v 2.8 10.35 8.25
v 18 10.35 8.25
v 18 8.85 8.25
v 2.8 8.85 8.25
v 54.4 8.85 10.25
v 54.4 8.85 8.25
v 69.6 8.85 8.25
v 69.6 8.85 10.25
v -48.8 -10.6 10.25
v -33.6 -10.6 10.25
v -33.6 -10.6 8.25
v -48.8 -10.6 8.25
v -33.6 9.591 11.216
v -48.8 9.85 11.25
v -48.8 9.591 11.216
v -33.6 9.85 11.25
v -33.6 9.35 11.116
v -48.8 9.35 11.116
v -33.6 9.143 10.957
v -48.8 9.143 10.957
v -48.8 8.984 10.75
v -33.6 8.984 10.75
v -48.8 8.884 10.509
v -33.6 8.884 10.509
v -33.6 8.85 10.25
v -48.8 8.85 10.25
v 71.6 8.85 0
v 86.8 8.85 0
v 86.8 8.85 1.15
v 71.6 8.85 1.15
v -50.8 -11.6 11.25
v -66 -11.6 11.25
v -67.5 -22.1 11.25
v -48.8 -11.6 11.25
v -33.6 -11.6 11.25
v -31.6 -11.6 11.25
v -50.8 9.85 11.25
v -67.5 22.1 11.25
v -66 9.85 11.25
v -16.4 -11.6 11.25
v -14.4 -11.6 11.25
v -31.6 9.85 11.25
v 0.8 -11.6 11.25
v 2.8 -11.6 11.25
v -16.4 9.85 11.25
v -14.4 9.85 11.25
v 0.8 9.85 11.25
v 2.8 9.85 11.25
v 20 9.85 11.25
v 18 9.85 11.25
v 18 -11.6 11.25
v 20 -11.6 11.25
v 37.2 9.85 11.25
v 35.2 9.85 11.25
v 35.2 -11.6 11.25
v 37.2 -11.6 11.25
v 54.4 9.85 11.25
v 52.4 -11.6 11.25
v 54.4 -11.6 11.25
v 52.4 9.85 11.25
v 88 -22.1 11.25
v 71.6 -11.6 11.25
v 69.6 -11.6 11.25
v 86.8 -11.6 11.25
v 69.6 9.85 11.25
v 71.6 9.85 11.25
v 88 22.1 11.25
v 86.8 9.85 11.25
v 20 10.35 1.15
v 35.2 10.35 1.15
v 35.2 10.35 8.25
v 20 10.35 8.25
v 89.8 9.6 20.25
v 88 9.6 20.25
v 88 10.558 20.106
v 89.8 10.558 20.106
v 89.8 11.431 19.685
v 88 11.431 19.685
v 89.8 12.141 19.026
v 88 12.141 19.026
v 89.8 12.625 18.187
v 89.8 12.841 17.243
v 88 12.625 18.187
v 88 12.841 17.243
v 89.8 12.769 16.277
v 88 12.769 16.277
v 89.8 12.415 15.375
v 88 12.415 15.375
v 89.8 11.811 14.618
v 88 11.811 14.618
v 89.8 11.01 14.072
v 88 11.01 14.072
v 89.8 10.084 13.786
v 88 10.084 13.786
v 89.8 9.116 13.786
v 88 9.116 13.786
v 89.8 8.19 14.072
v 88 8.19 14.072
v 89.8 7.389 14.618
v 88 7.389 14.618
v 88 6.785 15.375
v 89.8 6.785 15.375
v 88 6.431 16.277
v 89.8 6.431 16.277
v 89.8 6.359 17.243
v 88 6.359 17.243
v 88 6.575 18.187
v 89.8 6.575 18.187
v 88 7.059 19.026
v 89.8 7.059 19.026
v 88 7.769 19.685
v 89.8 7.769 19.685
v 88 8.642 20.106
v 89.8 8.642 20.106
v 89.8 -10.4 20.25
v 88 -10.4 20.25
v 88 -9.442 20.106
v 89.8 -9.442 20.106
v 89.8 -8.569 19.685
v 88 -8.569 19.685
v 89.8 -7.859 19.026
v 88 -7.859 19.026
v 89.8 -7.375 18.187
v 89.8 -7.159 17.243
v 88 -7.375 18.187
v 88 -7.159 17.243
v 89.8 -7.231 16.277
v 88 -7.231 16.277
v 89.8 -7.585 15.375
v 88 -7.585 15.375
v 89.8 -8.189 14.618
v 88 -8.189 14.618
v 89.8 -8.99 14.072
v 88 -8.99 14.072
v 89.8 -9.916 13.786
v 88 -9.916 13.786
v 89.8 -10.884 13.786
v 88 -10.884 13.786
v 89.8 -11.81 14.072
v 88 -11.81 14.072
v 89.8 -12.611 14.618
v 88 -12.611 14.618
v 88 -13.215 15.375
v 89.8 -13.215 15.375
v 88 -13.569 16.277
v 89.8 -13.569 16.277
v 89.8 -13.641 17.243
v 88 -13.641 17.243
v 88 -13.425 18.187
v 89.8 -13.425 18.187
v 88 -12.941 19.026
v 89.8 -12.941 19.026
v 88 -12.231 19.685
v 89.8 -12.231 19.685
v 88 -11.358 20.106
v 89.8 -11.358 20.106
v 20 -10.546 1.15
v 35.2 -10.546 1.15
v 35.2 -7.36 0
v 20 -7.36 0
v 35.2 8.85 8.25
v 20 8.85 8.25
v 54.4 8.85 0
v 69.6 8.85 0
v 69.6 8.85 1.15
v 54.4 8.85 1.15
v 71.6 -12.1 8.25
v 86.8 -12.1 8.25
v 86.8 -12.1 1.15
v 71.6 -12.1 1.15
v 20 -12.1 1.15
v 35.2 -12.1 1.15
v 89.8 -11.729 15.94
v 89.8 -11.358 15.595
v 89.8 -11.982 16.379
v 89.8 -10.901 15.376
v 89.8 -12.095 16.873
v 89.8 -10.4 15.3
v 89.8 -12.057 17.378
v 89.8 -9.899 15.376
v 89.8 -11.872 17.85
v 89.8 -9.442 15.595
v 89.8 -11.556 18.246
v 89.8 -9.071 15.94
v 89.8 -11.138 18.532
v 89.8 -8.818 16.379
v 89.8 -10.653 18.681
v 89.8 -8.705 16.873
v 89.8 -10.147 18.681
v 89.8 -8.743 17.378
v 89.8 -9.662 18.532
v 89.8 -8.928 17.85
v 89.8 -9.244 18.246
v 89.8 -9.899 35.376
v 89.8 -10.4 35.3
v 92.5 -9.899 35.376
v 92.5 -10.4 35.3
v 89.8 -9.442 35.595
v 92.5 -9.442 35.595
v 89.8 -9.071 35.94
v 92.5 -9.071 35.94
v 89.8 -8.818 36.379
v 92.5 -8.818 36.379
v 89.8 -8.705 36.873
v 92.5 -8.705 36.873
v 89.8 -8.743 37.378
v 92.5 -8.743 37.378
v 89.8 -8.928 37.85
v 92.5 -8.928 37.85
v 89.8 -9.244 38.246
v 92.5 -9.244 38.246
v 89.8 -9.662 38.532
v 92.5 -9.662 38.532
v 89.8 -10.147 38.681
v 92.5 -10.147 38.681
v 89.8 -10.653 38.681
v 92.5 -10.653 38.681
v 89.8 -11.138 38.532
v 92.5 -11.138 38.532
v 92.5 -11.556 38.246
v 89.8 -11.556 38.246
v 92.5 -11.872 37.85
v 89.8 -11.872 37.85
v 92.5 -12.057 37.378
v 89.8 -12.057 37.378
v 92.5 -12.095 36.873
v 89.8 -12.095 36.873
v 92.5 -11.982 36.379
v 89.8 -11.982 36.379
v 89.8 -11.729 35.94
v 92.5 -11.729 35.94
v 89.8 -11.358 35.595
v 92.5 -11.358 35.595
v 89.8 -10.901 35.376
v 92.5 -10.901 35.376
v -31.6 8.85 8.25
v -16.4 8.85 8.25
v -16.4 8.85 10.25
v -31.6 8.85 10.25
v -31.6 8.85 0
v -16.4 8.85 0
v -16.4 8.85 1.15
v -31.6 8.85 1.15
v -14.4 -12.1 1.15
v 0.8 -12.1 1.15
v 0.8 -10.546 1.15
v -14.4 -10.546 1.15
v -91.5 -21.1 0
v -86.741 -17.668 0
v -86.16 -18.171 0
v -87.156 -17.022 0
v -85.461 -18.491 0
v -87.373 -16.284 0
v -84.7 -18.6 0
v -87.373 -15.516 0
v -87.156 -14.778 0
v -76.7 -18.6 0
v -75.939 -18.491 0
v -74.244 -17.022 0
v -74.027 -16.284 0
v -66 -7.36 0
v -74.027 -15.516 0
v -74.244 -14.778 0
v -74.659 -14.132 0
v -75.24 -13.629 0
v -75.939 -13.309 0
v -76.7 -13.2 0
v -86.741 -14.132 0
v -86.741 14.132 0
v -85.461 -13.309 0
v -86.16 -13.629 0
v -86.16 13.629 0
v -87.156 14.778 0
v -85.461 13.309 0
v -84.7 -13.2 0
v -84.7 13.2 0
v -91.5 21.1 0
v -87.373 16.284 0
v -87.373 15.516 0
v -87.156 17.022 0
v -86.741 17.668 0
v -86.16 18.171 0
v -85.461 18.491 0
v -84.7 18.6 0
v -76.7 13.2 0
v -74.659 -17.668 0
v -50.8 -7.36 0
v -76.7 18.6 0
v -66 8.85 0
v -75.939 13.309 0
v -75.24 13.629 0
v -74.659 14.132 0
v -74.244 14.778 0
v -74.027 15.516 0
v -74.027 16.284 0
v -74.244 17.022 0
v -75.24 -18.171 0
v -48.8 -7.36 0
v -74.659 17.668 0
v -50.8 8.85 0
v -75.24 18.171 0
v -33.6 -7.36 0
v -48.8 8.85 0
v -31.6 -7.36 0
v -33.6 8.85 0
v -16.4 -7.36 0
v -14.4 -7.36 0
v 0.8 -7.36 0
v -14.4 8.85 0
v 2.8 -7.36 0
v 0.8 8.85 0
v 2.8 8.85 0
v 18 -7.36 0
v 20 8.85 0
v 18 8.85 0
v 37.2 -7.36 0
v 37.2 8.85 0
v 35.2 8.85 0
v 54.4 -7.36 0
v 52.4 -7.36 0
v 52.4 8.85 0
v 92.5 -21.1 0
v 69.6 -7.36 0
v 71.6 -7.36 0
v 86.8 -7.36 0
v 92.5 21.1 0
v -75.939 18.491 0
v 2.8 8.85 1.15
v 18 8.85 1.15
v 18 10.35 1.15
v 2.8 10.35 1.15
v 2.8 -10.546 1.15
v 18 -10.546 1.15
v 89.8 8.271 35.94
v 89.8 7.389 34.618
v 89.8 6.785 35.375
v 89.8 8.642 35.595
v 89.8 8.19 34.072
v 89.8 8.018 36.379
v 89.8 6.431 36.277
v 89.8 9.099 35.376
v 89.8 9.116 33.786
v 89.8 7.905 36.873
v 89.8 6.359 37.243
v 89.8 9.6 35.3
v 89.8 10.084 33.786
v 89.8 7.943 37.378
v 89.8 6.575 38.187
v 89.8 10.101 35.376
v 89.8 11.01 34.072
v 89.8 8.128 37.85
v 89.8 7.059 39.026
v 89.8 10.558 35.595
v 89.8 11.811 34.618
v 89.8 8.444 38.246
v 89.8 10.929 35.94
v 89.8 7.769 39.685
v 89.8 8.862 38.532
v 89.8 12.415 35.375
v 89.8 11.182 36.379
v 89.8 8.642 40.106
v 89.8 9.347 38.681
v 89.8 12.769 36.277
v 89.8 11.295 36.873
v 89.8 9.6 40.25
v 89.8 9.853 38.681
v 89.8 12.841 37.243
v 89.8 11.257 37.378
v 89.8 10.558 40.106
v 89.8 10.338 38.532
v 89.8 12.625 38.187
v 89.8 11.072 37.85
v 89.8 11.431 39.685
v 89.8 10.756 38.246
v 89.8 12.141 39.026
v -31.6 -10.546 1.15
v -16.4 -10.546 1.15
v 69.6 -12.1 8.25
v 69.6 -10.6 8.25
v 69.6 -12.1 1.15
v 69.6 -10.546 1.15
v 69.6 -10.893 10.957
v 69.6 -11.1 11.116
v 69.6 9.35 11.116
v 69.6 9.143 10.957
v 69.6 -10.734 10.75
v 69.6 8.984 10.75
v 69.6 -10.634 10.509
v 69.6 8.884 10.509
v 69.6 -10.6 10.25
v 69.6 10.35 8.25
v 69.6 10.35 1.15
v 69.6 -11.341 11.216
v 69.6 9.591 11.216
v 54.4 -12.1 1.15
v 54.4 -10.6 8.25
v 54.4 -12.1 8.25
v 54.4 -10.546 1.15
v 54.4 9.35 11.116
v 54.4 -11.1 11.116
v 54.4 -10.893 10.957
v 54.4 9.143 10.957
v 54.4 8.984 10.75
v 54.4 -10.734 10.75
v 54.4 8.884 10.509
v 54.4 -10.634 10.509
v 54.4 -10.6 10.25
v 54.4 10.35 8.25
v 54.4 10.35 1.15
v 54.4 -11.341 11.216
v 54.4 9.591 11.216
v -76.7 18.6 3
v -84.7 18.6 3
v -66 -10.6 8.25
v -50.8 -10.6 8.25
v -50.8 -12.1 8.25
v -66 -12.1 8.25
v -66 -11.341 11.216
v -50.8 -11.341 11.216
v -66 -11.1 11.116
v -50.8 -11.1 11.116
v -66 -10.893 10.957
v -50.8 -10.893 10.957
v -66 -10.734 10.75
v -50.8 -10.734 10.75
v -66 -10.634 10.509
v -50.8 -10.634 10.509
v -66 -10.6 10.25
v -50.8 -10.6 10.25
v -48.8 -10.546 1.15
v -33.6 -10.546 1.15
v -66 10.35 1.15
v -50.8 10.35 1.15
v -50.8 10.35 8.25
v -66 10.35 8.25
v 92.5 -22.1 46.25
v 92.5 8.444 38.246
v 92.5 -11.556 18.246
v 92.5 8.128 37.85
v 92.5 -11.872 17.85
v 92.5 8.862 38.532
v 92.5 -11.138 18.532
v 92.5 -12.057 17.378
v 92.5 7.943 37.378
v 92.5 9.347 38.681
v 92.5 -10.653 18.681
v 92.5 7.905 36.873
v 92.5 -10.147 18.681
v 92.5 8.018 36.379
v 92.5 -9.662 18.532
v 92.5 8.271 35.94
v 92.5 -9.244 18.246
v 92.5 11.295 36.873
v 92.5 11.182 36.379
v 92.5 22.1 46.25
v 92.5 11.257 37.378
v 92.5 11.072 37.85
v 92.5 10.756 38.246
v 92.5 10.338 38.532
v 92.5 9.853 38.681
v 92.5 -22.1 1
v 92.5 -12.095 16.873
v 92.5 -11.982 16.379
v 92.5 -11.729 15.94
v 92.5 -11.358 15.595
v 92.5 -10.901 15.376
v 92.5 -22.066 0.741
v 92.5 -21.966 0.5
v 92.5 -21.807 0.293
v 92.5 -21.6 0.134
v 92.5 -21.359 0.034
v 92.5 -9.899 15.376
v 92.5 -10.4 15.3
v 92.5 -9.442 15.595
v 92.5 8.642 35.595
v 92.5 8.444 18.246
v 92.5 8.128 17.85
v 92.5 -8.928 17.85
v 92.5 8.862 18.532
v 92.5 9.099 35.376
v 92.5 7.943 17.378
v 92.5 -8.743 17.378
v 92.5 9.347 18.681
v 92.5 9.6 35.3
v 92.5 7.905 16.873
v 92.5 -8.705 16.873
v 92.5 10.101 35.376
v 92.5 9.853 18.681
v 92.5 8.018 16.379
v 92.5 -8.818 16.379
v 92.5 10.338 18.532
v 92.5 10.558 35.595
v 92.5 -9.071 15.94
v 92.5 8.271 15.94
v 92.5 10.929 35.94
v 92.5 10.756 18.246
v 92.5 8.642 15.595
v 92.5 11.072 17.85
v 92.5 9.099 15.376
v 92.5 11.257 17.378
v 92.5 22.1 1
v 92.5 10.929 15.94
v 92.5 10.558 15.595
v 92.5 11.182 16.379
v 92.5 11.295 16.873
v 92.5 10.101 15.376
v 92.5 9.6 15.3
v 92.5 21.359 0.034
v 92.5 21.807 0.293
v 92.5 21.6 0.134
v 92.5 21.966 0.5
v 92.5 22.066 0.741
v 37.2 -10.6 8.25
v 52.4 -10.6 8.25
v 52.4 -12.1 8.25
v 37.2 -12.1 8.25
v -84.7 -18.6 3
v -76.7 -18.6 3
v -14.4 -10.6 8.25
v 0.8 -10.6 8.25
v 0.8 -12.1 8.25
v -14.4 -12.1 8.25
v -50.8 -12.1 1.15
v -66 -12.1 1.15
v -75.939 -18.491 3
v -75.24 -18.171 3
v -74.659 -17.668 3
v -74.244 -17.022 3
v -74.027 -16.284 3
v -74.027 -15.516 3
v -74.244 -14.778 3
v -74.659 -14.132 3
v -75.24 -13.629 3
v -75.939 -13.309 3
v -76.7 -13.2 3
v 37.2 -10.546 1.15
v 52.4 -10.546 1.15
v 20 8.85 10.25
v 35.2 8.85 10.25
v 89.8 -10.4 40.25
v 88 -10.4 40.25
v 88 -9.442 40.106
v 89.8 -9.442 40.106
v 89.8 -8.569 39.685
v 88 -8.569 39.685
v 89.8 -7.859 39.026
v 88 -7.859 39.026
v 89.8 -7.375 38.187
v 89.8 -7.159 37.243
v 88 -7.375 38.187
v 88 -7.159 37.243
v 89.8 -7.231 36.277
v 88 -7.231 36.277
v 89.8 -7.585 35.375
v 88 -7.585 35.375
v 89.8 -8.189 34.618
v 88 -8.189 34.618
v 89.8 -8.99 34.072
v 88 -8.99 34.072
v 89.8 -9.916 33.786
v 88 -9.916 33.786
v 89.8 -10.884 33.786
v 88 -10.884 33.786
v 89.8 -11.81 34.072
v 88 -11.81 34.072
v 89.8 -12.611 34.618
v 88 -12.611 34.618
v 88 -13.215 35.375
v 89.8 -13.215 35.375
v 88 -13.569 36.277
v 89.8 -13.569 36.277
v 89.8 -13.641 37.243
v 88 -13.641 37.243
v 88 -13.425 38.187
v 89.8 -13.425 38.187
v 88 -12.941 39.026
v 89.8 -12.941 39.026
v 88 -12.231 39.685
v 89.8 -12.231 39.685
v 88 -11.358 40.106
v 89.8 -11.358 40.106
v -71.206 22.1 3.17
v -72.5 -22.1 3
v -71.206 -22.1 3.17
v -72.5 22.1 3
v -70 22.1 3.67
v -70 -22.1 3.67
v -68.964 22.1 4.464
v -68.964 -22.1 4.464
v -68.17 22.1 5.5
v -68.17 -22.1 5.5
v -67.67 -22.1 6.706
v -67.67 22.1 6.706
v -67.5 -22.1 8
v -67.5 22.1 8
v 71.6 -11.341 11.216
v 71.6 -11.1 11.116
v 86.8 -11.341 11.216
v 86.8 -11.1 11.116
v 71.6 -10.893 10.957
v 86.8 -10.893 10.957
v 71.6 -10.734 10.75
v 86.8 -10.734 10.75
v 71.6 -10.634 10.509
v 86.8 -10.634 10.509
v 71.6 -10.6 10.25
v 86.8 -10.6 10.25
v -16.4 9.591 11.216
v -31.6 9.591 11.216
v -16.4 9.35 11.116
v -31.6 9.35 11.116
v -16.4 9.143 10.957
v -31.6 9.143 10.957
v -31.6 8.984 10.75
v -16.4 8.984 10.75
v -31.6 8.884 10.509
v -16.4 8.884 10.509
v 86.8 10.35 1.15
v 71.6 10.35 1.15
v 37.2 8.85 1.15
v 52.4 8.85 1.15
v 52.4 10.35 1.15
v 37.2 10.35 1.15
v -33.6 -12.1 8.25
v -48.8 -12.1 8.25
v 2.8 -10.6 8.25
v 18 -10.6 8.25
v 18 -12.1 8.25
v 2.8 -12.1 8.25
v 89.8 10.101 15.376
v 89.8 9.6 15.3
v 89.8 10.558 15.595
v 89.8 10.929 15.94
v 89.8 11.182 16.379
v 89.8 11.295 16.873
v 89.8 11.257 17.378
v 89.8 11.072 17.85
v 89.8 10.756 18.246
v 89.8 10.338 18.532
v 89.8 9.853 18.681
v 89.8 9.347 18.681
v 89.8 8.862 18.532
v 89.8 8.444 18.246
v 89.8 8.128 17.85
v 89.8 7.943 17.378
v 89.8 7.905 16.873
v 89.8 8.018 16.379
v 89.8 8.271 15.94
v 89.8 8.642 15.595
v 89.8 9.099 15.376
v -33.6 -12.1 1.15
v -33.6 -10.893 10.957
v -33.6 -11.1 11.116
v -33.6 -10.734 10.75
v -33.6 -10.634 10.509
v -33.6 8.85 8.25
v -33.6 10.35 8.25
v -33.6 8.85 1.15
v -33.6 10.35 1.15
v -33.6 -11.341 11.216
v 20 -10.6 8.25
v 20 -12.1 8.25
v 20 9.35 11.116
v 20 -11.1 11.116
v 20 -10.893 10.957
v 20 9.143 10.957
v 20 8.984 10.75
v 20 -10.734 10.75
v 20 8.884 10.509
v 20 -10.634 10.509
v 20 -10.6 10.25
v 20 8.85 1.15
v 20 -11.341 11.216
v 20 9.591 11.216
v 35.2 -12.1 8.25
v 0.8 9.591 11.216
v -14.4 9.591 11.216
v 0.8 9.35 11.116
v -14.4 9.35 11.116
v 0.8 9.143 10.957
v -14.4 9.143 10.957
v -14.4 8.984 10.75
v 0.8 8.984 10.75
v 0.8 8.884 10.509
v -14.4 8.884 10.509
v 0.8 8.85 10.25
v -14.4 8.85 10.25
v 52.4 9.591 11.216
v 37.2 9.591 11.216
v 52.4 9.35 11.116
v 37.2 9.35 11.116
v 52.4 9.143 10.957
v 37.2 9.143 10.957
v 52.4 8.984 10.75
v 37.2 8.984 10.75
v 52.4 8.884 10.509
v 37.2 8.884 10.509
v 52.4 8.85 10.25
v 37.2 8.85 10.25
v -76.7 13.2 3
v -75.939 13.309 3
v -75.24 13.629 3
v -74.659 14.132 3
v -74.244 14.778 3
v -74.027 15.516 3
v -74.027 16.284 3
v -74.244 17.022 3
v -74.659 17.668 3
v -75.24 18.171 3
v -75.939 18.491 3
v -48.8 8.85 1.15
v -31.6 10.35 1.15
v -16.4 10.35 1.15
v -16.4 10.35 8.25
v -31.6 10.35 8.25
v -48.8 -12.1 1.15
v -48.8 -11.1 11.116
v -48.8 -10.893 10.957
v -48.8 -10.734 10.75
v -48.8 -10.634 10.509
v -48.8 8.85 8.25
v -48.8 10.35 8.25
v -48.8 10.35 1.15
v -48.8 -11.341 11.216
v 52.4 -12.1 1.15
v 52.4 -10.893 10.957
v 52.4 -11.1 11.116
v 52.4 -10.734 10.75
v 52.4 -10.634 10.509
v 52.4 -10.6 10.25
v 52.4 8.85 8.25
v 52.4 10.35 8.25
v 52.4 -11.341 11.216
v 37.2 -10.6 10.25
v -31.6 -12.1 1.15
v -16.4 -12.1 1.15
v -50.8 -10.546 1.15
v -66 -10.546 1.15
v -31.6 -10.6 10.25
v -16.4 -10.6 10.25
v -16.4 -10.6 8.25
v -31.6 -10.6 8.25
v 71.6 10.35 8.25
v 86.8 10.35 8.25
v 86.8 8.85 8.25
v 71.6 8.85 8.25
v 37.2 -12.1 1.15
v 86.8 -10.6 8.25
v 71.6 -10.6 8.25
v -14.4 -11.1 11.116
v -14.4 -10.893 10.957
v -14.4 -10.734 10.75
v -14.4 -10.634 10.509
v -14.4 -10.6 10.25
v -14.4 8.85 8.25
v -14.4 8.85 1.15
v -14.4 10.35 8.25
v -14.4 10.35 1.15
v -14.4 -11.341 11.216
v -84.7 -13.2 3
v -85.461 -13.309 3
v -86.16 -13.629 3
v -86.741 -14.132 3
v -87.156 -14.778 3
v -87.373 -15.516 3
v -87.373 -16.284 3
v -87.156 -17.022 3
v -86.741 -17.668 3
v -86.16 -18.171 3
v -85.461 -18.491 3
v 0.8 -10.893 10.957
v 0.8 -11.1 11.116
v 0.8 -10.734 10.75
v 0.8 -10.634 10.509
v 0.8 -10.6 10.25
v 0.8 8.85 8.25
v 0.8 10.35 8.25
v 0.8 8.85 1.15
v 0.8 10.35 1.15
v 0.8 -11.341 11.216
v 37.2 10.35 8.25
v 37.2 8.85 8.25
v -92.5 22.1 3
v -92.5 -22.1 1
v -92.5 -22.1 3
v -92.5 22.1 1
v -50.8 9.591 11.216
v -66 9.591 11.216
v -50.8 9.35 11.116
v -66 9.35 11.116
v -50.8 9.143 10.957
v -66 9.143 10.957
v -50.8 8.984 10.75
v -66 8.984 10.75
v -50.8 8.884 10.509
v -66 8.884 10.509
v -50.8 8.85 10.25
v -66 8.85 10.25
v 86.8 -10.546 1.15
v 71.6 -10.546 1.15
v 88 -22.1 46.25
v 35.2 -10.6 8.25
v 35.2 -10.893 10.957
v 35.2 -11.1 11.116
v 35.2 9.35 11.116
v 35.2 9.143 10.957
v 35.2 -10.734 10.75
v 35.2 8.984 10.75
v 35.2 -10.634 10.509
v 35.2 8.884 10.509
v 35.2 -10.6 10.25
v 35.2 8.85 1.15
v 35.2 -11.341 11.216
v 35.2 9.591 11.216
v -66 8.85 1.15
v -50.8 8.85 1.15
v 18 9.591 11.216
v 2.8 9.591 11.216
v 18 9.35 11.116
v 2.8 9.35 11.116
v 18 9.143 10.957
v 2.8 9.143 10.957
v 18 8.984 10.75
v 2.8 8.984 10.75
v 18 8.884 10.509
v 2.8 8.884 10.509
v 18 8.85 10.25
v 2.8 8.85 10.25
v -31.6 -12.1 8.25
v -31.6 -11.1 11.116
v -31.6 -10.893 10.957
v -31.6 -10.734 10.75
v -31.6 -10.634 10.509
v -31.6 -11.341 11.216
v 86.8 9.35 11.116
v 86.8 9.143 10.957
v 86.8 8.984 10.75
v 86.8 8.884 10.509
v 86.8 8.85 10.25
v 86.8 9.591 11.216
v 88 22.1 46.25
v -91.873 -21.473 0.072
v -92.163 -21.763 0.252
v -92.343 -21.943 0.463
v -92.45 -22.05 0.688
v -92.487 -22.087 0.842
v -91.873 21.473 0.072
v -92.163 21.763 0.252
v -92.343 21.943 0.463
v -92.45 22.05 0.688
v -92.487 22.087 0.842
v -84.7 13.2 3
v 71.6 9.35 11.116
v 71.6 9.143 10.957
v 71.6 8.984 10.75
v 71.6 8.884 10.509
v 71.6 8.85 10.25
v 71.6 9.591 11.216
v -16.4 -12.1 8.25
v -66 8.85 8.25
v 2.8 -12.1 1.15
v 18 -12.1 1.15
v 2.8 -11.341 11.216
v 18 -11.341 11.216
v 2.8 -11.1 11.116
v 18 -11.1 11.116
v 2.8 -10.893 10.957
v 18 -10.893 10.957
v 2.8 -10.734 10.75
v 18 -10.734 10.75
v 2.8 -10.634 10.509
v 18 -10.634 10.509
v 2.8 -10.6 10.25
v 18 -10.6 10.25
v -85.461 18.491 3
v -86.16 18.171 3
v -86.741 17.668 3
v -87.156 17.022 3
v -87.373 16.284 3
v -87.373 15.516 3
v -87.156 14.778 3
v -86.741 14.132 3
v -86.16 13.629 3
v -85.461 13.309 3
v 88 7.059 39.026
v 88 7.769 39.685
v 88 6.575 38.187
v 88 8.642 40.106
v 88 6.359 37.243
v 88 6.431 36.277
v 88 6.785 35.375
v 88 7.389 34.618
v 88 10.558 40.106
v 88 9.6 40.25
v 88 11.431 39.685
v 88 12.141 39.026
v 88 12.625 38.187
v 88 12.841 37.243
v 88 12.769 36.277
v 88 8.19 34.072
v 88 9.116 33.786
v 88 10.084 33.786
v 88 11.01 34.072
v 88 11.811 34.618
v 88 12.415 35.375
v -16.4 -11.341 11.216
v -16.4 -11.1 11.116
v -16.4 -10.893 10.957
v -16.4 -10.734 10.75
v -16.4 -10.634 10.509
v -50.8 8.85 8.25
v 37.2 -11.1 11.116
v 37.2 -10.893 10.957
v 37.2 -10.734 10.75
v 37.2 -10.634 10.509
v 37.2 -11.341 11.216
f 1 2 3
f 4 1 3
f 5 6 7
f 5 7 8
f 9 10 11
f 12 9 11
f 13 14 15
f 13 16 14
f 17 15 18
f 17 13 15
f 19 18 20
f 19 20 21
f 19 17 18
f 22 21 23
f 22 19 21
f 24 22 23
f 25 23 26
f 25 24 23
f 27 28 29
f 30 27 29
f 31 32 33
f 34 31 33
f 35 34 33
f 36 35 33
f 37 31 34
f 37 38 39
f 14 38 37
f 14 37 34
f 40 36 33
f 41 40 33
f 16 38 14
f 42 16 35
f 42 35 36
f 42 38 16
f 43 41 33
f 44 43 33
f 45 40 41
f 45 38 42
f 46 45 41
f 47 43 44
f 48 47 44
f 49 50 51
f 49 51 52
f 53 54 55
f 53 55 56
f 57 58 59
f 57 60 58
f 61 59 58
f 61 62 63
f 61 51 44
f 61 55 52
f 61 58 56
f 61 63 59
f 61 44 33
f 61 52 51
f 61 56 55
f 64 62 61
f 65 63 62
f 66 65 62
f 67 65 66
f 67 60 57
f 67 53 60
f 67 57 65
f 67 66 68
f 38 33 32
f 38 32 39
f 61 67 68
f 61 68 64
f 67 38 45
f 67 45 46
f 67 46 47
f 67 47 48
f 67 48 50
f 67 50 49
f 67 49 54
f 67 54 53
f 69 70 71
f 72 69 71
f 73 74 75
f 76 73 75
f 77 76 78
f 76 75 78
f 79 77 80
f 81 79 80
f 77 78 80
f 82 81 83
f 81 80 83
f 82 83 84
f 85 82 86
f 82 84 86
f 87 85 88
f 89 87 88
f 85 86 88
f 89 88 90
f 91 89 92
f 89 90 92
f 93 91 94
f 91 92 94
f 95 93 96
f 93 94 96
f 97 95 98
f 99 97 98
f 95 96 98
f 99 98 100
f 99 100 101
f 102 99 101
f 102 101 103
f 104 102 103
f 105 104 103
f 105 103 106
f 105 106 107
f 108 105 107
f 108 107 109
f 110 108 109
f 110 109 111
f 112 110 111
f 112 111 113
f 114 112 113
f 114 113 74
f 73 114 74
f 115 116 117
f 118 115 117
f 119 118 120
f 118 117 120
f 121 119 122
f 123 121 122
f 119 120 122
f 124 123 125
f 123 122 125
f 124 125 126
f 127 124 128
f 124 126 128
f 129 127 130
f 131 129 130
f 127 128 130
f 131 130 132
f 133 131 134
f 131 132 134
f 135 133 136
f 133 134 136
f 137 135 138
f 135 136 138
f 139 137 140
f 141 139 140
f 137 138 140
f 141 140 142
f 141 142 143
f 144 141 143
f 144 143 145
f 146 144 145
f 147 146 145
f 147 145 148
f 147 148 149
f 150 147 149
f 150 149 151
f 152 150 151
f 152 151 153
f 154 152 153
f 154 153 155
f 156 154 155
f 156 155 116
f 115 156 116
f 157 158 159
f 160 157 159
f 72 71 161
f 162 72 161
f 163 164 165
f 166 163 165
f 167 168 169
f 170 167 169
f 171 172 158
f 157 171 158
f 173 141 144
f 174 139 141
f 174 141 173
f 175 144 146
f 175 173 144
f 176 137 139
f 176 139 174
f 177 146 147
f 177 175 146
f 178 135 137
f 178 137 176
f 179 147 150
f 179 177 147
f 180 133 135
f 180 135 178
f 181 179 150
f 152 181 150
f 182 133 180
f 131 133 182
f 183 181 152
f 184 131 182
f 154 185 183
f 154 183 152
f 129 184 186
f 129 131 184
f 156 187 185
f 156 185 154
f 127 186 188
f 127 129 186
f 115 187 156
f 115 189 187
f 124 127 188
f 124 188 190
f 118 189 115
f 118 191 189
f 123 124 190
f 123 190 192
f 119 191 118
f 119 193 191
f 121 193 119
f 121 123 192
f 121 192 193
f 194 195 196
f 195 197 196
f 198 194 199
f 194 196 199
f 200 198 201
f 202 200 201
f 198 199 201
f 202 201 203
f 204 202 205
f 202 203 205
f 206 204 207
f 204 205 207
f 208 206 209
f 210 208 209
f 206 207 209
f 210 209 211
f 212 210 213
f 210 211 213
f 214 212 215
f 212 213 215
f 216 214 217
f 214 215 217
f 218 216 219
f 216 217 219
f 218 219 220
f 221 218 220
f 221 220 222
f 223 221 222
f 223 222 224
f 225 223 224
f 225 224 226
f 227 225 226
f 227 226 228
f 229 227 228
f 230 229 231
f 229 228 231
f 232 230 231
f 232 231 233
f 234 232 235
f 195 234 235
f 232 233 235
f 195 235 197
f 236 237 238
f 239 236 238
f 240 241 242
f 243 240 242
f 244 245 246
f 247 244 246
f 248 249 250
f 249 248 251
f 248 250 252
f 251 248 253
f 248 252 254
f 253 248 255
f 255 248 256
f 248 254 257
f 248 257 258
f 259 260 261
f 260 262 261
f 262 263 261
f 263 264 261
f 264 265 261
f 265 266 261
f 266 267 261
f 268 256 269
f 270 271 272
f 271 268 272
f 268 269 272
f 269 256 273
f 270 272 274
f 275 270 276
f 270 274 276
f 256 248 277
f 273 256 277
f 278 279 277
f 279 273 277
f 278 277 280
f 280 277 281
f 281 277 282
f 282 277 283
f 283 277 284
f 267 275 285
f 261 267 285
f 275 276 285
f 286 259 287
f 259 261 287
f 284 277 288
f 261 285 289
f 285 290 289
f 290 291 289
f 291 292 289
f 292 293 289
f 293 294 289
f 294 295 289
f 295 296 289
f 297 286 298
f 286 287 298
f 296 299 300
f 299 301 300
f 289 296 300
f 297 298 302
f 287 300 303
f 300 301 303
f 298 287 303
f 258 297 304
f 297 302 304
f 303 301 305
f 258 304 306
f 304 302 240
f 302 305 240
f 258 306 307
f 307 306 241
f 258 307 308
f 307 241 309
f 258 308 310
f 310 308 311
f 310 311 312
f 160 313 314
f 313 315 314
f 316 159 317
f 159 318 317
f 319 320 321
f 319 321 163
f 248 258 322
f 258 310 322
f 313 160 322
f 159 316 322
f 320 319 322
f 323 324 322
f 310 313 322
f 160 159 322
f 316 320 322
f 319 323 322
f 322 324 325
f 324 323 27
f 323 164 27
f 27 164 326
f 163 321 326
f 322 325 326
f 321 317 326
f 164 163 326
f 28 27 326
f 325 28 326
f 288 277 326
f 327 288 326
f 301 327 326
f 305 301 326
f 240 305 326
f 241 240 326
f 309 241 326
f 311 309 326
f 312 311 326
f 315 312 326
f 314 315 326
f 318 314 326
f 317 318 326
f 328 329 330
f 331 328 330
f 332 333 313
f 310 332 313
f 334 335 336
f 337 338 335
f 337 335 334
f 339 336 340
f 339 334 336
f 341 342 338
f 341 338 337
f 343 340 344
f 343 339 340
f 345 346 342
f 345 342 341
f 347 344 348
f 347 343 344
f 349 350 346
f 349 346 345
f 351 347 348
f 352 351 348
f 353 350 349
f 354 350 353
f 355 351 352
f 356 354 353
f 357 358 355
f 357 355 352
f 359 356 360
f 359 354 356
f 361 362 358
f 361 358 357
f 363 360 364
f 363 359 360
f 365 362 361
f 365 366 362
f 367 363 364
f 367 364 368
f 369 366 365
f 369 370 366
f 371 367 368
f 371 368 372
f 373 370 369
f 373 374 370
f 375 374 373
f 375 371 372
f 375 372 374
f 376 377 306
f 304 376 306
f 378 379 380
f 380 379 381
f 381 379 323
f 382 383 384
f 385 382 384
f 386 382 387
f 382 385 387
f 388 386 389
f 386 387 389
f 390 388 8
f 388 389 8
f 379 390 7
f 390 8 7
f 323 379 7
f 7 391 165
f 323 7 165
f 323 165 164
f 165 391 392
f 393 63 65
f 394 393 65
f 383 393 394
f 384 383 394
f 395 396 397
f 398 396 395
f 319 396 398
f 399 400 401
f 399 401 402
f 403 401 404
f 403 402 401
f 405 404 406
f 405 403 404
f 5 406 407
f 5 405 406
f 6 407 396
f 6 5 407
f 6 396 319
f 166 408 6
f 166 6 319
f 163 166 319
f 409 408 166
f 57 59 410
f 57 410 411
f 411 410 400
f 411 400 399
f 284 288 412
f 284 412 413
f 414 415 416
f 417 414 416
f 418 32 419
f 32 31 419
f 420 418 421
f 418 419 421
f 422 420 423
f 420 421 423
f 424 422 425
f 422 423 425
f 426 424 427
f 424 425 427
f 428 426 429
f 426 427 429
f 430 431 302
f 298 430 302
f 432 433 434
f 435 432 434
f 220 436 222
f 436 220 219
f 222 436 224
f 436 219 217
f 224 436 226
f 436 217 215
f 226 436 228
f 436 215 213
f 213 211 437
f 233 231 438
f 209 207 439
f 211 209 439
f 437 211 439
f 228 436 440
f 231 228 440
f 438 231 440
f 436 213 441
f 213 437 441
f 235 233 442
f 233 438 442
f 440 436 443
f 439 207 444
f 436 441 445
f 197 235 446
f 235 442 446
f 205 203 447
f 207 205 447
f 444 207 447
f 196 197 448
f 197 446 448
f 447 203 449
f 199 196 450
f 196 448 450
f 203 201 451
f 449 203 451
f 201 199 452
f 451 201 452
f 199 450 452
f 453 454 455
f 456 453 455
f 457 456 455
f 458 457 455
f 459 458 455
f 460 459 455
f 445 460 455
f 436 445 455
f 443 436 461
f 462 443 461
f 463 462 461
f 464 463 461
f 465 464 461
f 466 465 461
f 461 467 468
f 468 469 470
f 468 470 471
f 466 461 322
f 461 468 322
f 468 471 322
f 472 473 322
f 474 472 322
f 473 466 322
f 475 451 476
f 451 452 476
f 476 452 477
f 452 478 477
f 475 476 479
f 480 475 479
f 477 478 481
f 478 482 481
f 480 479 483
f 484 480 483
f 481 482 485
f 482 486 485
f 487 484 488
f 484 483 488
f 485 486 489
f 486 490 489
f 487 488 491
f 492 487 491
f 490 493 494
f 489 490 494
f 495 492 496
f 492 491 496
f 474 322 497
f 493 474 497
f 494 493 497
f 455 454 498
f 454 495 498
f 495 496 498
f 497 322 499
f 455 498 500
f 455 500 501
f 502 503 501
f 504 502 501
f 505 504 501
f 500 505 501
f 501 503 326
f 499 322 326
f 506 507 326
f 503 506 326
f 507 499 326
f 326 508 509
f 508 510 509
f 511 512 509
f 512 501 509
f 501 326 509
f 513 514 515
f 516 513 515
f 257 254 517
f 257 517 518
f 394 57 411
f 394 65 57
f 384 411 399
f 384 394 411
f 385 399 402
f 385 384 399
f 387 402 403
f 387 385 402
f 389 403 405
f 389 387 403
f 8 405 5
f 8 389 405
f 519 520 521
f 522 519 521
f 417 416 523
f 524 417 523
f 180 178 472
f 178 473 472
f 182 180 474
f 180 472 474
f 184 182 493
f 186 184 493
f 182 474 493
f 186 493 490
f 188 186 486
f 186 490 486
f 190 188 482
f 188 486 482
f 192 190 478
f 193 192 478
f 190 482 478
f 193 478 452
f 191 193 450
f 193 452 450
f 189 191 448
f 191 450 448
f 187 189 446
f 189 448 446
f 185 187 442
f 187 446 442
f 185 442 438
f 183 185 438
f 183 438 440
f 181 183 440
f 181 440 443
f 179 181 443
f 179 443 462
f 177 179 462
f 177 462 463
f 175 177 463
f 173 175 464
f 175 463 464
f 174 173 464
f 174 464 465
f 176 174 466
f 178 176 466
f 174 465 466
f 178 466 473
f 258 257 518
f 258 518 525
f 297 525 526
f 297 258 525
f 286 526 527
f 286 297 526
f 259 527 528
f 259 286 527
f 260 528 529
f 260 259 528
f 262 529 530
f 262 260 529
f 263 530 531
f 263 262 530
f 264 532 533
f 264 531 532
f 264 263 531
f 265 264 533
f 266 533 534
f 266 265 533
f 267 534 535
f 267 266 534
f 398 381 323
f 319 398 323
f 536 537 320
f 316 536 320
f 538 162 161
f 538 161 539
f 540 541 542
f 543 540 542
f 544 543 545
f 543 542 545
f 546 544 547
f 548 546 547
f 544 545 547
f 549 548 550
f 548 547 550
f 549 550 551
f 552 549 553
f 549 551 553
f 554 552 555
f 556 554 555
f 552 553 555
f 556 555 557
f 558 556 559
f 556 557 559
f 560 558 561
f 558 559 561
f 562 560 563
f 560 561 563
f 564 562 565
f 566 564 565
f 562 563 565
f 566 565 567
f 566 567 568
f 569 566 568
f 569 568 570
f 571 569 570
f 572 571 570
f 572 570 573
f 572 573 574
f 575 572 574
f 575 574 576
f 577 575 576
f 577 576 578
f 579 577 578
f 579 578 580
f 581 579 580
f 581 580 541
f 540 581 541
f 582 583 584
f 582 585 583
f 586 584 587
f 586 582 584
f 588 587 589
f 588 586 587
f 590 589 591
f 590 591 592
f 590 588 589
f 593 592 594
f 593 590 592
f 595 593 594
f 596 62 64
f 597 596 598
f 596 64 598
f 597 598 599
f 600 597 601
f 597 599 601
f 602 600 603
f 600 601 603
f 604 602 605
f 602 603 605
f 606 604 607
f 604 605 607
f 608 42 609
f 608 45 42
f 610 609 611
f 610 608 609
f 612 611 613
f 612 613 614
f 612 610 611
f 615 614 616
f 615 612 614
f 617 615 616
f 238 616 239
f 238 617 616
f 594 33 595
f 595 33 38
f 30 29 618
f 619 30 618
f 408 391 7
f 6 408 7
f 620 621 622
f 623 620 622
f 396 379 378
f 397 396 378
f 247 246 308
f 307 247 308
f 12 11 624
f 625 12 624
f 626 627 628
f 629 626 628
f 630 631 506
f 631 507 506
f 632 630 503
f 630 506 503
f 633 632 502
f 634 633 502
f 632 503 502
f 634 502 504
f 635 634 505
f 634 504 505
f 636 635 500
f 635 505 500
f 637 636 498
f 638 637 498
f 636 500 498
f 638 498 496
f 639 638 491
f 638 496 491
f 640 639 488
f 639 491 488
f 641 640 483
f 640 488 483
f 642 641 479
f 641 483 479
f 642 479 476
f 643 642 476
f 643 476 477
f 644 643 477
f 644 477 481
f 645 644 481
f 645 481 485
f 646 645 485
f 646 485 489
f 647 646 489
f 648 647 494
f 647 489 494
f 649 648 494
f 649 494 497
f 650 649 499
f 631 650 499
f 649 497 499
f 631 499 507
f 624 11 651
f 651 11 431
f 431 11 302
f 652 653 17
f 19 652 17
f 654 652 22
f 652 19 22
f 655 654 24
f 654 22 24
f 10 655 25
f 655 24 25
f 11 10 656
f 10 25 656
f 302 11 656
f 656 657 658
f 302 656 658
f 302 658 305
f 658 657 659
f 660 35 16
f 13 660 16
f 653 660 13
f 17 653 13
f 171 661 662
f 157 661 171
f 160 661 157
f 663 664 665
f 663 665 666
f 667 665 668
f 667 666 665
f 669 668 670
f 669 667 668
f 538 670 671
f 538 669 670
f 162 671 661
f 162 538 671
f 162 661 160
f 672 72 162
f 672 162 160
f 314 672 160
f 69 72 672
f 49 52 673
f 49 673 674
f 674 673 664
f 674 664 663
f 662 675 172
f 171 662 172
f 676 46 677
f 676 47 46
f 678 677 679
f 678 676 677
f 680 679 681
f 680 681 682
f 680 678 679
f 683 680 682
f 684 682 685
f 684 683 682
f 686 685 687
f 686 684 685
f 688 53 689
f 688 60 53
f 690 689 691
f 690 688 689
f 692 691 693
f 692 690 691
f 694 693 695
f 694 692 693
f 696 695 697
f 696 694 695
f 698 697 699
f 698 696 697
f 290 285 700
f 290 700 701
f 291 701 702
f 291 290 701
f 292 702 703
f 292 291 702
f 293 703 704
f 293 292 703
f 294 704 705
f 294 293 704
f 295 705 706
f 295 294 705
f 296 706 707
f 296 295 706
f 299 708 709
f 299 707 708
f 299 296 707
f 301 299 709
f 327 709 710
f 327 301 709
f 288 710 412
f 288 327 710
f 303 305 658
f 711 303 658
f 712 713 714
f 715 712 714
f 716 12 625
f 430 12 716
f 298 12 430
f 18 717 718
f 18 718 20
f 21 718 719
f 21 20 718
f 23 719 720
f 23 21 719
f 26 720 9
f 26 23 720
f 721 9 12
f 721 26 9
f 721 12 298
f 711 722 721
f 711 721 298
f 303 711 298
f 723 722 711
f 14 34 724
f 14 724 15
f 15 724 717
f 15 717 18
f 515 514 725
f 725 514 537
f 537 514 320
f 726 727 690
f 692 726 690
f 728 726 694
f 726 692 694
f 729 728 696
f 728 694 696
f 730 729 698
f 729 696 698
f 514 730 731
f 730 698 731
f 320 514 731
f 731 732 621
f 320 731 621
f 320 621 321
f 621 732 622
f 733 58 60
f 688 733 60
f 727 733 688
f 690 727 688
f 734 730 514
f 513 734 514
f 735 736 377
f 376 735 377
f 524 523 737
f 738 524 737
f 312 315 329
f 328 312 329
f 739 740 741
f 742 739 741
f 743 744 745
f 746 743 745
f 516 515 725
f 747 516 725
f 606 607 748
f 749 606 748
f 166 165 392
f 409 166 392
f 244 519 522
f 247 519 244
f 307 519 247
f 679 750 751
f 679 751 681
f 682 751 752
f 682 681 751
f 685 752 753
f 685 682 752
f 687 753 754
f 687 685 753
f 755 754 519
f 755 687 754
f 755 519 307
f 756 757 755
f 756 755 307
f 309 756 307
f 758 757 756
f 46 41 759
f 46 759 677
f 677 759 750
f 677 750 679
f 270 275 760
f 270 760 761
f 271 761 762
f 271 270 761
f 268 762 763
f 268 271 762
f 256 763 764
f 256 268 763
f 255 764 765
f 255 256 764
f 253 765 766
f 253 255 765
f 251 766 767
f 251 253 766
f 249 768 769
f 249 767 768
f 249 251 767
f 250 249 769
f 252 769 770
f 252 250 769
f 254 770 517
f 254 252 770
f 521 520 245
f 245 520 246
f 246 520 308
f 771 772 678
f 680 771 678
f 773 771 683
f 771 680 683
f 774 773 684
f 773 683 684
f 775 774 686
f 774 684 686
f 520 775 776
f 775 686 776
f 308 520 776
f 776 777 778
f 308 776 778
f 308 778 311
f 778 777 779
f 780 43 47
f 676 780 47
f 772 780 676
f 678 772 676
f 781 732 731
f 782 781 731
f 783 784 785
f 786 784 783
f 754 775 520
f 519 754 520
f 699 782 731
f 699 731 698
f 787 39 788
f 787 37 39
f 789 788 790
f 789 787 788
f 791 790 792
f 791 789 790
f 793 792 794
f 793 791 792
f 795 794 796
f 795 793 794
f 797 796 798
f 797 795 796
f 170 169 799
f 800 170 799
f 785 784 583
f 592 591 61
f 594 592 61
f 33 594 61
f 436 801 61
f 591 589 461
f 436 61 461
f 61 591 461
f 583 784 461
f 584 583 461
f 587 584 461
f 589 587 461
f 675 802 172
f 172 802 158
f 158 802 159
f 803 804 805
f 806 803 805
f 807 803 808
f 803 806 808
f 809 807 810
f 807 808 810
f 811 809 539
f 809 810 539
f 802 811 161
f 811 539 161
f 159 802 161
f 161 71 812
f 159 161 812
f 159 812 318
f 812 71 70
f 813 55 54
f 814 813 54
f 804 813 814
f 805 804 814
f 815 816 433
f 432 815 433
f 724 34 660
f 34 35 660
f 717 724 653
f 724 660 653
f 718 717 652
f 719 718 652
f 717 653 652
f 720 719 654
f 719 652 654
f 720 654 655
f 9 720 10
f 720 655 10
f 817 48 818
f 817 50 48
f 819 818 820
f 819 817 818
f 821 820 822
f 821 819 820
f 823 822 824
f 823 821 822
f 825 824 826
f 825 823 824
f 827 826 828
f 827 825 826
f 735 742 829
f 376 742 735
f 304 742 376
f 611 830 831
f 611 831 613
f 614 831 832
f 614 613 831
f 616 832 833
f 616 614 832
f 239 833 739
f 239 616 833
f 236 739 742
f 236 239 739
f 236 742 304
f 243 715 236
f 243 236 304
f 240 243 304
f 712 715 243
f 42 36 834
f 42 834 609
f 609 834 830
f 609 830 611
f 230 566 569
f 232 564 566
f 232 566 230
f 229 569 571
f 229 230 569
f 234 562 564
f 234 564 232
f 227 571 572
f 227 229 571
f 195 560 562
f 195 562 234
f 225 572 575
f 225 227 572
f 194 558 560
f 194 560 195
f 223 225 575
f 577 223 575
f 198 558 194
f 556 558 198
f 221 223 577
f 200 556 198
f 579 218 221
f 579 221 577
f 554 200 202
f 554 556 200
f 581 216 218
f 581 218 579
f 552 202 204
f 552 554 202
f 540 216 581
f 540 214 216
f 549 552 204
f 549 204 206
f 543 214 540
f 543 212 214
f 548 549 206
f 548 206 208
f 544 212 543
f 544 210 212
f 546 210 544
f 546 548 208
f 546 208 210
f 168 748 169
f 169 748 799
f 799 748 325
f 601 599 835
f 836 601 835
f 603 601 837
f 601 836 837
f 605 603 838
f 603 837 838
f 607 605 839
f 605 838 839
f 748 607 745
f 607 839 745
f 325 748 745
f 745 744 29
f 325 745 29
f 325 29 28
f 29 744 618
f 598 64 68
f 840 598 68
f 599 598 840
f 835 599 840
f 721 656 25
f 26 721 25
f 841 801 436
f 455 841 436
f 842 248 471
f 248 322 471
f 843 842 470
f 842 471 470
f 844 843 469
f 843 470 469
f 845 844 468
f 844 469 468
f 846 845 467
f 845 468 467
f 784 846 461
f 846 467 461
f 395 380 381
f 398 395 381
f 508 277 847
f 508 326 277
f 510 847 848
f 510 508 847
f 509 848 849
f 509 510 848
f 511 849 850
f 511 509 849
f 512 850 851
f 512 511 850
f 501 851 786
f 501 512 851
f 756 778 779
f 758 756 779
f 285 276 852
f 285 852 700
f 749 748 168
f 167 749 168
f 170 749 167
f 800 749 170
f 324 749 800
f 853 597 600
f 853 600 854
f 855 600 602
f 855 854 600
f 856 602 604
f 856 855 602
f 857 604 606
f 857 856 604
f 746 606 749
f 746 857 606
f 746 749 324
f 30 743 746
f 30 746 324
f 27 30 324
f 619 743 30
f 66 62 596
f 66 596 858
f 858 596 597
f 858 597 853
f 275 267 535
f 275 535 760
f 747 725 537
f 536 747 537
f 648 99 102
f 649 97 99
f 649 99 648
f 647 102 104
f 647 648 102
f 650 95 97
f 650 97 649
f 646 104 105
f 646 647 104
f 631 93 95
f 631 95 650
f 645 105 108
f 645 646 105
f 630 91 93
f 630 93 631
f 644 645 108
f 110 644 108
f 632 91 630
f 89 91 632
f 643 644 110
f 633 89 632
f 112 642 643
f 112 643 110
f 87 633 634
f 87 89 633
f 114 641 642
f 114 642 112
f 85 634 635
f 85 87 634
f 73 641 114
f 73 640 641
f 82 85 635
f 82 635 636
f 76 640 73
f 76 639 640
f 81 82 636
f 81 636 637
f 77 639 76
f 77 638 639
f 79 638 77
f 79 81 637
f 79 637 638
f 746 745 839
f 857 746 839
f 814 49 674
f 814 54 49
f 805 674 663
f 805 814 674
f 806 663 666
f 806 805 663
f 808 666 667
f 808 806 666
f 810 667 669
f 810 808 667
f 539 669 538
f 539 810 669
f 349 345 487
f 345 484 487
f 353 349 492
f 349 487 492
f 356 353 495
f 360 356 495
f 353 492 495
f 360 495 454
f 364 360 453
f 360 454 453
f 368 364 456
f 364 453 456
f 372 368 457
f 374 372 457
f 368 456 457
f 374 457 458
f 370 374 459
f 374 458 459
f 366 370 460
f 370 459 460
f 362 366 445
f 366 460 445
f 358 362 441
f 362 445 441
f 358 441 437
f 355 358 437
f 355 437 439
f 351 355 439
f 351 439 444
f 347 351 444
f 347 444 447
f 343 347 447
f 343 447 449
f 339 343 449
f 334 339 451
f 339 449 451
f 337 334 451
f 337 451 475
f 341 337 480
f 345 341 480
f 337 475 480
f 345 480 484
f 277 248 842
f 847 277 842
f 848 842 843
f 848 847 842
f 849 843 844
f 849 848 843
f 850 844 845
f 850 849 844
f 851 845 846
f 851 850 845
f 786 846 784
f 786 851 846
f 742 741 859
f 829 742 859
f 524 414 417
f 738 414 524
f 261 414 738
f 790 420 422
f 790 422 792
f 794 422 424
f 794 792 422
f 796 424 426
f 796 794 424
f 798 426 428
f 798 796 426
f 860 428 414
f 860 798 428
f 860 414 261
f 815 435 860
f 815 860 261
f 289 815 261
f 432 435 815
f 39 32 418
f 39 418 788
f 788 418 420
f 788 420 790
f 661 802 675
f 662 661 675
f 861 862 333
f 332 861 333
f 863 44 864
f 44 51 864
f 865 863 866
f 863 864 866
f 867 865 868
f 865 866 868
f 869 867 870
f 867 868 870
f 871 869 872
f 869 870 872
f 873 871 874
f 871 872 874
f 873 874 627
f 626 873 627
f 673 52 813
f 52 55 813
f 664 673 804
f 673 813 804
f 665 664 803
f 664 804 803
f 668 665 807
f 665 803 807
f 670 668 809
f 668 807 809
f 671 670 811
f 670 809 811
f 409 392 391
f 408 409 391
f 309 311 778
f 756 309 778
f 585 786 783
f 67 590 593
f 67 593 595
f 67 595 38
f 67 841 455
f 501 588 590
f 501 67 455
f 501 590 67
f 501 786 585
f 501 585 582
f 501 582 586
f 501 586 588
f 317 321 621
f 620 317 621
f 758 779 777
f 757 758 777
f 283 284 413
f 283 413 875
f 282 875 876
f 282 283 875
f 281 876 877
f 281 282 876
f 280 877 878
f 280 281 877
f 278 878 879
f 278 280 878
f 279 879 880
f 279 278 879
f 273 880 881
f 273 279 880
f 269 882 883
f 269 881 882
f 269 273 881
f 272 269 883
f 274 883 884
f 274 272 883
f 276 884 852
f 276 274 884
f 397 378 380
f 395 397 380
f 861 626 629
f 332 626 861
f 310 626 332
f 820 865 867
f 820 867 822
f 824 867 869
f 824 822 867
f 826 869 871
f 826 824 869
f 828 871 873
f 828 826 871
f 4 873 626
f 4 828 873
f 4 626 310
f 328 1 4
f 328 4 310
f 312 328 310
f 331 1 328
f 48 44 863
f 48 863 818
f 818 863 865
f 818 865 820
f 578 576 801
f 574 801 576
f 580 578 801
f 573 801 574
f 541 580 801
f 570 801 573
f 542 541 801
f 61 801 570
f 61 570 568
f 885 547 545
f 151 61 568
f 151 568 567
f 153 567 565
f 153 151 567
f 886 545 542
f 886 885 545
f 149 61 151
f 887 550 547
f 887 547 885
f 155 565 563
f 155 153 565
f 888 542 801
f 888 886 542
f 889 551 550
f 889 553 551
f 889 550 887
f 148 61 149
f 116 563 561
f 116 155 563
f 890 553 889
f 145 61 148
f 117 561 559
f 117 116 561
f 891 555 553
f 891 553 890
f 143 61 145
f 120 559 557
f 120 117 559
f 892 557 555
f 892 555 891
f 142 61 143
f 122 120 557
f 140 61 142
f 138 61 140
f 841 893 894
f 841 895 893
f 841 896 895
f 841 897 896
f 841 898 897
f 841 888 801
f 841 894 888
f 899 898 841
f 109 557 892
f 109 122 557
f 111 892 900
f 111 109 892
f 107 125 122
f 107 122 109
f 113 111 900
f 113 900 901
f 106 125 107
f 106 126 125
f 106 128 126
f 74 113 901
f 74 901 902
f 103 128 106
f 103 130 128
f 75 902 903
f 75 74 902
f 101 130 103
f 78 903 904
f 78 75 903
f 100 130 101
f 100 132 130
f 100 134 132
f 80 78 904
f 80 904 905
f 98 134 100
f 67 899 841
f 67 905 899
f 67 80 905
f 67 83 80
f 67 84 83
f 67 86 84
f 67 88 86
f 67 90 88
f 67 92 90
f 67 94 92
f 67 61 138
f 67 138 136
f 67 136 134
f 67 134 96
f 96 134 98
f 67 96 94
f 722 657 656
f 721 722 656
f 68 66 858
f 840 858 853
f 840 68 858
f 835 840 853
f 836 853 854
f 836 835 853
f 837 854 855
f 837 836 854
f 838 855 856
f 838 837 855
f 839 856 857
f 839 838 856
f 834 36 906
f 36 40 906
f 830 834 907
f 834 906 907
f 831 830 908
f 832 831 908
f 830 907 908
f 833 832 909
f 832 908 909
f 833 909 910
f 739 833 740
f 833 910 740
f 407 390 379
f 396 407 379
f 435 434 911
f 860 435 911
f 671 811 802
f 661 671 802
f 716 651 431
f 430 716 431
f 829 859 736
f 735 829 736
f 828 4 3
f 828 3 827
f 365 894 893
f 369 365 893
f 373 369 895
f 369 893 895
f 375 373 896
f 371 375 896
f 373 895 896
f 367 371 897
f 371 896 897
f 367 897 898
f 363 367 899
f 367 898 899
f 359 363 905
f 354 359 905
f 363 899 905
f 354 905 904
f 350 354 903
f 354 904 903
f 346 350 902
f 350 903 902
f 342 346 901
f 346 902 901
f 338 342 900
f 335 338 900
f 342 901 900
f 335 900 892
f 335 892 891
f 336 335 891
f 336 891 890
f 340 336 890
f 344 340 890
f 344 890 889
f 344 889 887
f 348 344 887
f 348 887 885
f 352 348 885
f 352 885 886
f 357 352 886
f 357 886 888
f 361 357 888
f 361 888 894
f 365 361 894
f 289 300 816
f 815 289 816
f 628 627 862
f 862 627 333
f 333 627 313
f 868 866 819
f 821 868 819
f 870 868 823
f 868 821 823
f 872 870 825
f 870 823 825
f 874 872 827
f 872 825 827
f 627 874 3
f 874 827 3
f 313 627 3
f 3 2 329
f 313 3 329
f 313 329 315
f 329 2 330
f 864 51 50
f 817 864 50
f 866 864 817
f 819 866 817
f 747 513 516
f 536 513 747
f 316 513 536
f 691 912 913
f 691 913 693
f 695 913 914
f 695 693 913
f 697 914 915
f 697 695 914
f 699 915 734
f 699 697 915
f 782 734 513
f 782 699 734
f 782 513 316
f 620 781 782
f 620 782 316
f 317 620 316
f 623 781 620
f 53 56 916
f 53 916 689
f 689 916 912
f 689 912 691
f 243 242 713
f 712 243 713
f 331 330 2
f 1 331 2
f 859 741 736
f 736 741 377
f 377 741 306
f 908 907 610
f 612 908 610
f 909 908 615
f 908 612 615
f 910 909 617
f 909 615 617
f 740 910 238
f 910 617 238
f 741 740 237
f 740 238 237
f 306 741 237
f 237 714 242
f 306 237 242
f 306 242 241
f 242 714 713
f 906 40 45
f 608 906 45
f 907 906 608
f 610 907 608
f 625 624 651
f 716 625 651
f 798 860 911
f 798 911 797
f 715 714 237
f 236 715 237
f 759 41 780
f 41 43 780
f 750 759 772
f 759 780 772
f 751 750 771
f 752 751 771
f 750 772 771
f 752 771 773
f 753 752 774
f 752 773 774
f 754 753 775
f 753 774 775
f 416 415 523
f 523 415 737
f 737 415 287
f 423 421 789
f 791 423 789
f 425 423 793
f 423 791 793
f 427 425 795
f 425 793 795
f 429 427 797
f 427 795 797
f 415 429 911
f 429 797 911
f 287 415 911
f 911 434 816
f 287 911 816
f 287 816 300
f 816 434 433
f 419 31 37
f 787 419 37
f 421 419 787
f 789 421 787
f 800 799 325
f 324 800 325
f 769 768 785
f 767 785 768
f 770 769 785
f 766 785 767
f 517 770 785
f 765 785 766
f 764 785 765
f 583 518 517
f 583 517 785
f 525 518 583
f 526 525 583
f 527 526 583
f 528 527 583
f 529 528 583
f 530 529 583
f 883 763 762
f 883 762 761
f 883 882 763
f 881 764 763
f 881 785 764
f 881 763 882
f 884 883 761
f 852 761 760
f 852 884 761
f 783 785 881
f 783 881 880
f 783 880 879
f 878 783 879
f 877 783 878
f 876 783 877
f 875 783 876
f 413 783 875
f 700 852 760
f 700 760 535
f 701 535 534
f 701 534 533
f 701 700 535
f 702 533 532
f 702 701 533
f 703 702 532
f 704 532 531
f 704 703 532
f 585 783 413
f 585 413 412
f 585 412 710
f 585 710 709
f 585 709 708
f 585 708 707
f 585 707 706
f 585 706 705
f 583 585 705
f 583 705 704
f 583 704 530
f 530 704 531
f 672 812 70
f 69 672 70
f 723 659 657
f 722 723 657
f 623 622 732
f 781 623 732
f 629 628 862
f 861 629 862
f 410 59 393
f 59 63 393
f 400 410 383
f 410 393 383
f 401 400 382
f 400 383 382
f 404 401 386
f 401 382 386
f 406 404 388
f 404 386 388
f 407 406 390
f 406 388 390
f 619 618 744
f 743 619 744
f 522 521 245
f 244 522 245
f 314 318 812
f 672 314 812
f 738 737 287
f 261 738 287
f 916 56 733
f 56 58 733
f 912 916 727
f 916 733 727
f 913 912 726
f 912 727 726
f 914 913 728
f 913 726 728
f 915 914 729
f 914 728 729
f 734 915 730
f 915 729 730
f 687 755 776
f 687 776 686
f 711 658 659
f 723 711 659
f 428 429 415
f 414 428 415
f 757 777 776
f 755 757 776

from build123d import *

# Parameters (mm, degrees)
SKETCH1_W                      = 185
SKETCH1_H                      = 44.2
BOSS_EXTRUDE1_DEPTH            = 11.25
SKETCH2_W                      = 25
SKETCH2_H                      = 44.2
CUT_EXTRUDE1_DEPTH             = 8.25
FILLET1_R                      = 5
CUT_EXTRUDE2_DEPTH             = 15.2
LPATTERN1_COUNT                = 9
LPATTERN1_PITCH                = 17.2
SKETCH4_W                      = 4.5
SKETCH4_H                      = 44.2
BOSS_EXTRUDE2_DEPTH            = 35
CBORE_FOR_M3_SHCS1_D           = 3.4
CBORE_FOR_M3_SHCS1_DEPTH       = 10.1
CBORE_FOR_M3_SHCS1_CBORE_D     = 6.5
CBORE_FOR_M3_SHCS1_CBORE_DEPTH = 3
CBORE_FOR_M3_SHCS1_TIP         = 1.021463052
CUT_EXTRUDE3_DEPTH             = 35
FILLET2_R                      = 1
FILLET3_R                      = 1


with BuildPart() as part:
    # Sketch1 → Boss-Extrude1 (new body)
    with BuildSketch(Plane.XY):
        Rectangle(SKETCH1_W, SKETCH1_H)
    extrude(amount=BOSS_EXTRUDE1_DEPTH)

    # Sketch2 → Cut-Extrude1 (cut)
    with BuildSketch(Plane.XY.offset(11.25)):
        with Locations((-80, 0)):
            Rectangle(SKETCH2_W, SKETCH2_H)
    extrude(amount=-CUT_EXTRUDE1_DEPTH, mode=Mode.SUBTRACT)

    # Fillet1
    fillet1_edges = [part.edges().sort_by_distance(p)[0] for p in [
        (-67.5, 0, 3),
    ]]
    fillet(fillet1_edges, radius=FILLET1_R)

    # Sketch3 → Cut-Extrude2 (cut)
    with BuildSketch(Plane.ZY.offset(66)):
        Polygon((0, 8.85), (1.15, 8.85), (1.15, 10.35), (8.25, 10.35), (8.25, 8.85), (11.25, 8.85), (11.25, -10.6), (8.25, -10.6), (8.25, -12.1), (1.15, -12.1), (1.15, -10.545741226), (0, -7.36), align=None)
    cut_extrude2 = extrude(amount=-CUT_EXTRUDE2_DEPTH, mode=Mode.SUBTRACT)

    # LPattern1: Cut-Extrude2 ×9
    with Locations(*[(i * LPATTERN1_PITCH, 0, 0) for i in range(1, LPATTERN1_COUNT)]):
        add(cut_extrude2, mode=Mode.SUBTRACT)

    # Sketch4 → Boss-Extrude2 (add)
    with BuildSketch(Plane.XY.offset(11.25)):
        with Locations((90.25, 0)):
            Rectangle(SKETCH4_W, SKETCH4_H)
    extrude(amount=BOSS_EXTRUDE2_DEPTH)

    # CBORE for M3 SHCS1
    with Locations(Plane.ZY.offset(-86.8)):
        with Locations((17, 9.6), (37, 9.6), (17, -10.4), (37, -10.4)):
            CounterBoreHole(CBORE_FOR_M3_SHCS1_D / 2, CBORE_FOR_M3_SHCS1_CBORE_D / 2, CBORE_FOR_M3_SHCS1_CBORE_DEPTH, depth=CBORE_FOR_M3_SHCS1_DEPTH)
            with Locations((0, 0, -(CBORE_FOR_M3_SHCS1_DEPTH + CBORE_FOR_M3_SHCS1_TIP / 2))):  # 118° drill point
                Cone(0, CBORE_FOR_M3_SHCS1_D / 2, CBORE_FOR_M3_SHCS1_TIP, mode=Mode.SUBTRACT)

    # Sketch10 → Cut-Extrude3 (cut)
    with BuildSketch(Plane(origin=(0, 0, 0), x_dir=(-1, 0, 0), z_dir=(0, 0, -1))):
        with BuildLine():
            Line((76.7, 18.6), (84.7, 18.6))
            ThreePointArc((84.7, 18.6), (87.4, 15.9), (84.7, 13.2))
            Line((84.7, 13.2), (76.7, 13.2))
            ThreePointArc((76.7, 13.2), (74, 15.9), (76.7, 18.6))
        make_face()
        with BuildLine():
            Line((76.7, -13.2), (84.7, -13.2))
            ThreePointArc((84.7, -13.2), (87.4, -15.9), (84.7, -18.6))
            Line((84.7, -18.6), (76.7, -18.6))
            ThreePointArc((76.7, -18.6), (74, -15.9), (76.7, -13.2))
        make_face()
    extrude(amount=-CUT_EXTRUDE3_DEPTH, mode=Mode.SUBTRACT)

    # Fillet2
    fillet2_edges = [part.edges().sort_by_distance(p)[0] for p in [
        (-41.2, 8.85, 11.25),
        (-41.2, -10.6, 11.25),
        (-24, 8.85, 11.25),
        (-24, -10.6, 11.25),
        (-6.8, 8.85, 11.25),
        (-6.8, -10.6, 11.25),
        (10.4, 8.85, 11.25),
        (10.4, -10.6, 11.25),
        (27.6, 8.85, 11.25),
        (27.6, -10.6, 11.25),
        (44.8, 8.85, 11.25),
        (44.8, -10.6, 11.25),
        (62, 8.85, 11.25),
        (62, -10.6, 11.25),
        (79.2, 8.85, 11.25),
        (79.2, -10.6, 11.25),
        (-58.4, 8.85, 11.25),
        (-58.4, -10.6, 11.25),
    ]]
    fillet(fillet2_edges, radius=FILLET2_R)

    # Fillet3
    fillet3_edges = [part.edges().sort_by_distance(p)[0] for p in [
        (0, -22.1, 0),
        (-92.5, 0, 0),
        (0, 22.1, 0),
    ]]
    fillet(fillet3_edges, radius=FILLET3_R)


solid = part.part
